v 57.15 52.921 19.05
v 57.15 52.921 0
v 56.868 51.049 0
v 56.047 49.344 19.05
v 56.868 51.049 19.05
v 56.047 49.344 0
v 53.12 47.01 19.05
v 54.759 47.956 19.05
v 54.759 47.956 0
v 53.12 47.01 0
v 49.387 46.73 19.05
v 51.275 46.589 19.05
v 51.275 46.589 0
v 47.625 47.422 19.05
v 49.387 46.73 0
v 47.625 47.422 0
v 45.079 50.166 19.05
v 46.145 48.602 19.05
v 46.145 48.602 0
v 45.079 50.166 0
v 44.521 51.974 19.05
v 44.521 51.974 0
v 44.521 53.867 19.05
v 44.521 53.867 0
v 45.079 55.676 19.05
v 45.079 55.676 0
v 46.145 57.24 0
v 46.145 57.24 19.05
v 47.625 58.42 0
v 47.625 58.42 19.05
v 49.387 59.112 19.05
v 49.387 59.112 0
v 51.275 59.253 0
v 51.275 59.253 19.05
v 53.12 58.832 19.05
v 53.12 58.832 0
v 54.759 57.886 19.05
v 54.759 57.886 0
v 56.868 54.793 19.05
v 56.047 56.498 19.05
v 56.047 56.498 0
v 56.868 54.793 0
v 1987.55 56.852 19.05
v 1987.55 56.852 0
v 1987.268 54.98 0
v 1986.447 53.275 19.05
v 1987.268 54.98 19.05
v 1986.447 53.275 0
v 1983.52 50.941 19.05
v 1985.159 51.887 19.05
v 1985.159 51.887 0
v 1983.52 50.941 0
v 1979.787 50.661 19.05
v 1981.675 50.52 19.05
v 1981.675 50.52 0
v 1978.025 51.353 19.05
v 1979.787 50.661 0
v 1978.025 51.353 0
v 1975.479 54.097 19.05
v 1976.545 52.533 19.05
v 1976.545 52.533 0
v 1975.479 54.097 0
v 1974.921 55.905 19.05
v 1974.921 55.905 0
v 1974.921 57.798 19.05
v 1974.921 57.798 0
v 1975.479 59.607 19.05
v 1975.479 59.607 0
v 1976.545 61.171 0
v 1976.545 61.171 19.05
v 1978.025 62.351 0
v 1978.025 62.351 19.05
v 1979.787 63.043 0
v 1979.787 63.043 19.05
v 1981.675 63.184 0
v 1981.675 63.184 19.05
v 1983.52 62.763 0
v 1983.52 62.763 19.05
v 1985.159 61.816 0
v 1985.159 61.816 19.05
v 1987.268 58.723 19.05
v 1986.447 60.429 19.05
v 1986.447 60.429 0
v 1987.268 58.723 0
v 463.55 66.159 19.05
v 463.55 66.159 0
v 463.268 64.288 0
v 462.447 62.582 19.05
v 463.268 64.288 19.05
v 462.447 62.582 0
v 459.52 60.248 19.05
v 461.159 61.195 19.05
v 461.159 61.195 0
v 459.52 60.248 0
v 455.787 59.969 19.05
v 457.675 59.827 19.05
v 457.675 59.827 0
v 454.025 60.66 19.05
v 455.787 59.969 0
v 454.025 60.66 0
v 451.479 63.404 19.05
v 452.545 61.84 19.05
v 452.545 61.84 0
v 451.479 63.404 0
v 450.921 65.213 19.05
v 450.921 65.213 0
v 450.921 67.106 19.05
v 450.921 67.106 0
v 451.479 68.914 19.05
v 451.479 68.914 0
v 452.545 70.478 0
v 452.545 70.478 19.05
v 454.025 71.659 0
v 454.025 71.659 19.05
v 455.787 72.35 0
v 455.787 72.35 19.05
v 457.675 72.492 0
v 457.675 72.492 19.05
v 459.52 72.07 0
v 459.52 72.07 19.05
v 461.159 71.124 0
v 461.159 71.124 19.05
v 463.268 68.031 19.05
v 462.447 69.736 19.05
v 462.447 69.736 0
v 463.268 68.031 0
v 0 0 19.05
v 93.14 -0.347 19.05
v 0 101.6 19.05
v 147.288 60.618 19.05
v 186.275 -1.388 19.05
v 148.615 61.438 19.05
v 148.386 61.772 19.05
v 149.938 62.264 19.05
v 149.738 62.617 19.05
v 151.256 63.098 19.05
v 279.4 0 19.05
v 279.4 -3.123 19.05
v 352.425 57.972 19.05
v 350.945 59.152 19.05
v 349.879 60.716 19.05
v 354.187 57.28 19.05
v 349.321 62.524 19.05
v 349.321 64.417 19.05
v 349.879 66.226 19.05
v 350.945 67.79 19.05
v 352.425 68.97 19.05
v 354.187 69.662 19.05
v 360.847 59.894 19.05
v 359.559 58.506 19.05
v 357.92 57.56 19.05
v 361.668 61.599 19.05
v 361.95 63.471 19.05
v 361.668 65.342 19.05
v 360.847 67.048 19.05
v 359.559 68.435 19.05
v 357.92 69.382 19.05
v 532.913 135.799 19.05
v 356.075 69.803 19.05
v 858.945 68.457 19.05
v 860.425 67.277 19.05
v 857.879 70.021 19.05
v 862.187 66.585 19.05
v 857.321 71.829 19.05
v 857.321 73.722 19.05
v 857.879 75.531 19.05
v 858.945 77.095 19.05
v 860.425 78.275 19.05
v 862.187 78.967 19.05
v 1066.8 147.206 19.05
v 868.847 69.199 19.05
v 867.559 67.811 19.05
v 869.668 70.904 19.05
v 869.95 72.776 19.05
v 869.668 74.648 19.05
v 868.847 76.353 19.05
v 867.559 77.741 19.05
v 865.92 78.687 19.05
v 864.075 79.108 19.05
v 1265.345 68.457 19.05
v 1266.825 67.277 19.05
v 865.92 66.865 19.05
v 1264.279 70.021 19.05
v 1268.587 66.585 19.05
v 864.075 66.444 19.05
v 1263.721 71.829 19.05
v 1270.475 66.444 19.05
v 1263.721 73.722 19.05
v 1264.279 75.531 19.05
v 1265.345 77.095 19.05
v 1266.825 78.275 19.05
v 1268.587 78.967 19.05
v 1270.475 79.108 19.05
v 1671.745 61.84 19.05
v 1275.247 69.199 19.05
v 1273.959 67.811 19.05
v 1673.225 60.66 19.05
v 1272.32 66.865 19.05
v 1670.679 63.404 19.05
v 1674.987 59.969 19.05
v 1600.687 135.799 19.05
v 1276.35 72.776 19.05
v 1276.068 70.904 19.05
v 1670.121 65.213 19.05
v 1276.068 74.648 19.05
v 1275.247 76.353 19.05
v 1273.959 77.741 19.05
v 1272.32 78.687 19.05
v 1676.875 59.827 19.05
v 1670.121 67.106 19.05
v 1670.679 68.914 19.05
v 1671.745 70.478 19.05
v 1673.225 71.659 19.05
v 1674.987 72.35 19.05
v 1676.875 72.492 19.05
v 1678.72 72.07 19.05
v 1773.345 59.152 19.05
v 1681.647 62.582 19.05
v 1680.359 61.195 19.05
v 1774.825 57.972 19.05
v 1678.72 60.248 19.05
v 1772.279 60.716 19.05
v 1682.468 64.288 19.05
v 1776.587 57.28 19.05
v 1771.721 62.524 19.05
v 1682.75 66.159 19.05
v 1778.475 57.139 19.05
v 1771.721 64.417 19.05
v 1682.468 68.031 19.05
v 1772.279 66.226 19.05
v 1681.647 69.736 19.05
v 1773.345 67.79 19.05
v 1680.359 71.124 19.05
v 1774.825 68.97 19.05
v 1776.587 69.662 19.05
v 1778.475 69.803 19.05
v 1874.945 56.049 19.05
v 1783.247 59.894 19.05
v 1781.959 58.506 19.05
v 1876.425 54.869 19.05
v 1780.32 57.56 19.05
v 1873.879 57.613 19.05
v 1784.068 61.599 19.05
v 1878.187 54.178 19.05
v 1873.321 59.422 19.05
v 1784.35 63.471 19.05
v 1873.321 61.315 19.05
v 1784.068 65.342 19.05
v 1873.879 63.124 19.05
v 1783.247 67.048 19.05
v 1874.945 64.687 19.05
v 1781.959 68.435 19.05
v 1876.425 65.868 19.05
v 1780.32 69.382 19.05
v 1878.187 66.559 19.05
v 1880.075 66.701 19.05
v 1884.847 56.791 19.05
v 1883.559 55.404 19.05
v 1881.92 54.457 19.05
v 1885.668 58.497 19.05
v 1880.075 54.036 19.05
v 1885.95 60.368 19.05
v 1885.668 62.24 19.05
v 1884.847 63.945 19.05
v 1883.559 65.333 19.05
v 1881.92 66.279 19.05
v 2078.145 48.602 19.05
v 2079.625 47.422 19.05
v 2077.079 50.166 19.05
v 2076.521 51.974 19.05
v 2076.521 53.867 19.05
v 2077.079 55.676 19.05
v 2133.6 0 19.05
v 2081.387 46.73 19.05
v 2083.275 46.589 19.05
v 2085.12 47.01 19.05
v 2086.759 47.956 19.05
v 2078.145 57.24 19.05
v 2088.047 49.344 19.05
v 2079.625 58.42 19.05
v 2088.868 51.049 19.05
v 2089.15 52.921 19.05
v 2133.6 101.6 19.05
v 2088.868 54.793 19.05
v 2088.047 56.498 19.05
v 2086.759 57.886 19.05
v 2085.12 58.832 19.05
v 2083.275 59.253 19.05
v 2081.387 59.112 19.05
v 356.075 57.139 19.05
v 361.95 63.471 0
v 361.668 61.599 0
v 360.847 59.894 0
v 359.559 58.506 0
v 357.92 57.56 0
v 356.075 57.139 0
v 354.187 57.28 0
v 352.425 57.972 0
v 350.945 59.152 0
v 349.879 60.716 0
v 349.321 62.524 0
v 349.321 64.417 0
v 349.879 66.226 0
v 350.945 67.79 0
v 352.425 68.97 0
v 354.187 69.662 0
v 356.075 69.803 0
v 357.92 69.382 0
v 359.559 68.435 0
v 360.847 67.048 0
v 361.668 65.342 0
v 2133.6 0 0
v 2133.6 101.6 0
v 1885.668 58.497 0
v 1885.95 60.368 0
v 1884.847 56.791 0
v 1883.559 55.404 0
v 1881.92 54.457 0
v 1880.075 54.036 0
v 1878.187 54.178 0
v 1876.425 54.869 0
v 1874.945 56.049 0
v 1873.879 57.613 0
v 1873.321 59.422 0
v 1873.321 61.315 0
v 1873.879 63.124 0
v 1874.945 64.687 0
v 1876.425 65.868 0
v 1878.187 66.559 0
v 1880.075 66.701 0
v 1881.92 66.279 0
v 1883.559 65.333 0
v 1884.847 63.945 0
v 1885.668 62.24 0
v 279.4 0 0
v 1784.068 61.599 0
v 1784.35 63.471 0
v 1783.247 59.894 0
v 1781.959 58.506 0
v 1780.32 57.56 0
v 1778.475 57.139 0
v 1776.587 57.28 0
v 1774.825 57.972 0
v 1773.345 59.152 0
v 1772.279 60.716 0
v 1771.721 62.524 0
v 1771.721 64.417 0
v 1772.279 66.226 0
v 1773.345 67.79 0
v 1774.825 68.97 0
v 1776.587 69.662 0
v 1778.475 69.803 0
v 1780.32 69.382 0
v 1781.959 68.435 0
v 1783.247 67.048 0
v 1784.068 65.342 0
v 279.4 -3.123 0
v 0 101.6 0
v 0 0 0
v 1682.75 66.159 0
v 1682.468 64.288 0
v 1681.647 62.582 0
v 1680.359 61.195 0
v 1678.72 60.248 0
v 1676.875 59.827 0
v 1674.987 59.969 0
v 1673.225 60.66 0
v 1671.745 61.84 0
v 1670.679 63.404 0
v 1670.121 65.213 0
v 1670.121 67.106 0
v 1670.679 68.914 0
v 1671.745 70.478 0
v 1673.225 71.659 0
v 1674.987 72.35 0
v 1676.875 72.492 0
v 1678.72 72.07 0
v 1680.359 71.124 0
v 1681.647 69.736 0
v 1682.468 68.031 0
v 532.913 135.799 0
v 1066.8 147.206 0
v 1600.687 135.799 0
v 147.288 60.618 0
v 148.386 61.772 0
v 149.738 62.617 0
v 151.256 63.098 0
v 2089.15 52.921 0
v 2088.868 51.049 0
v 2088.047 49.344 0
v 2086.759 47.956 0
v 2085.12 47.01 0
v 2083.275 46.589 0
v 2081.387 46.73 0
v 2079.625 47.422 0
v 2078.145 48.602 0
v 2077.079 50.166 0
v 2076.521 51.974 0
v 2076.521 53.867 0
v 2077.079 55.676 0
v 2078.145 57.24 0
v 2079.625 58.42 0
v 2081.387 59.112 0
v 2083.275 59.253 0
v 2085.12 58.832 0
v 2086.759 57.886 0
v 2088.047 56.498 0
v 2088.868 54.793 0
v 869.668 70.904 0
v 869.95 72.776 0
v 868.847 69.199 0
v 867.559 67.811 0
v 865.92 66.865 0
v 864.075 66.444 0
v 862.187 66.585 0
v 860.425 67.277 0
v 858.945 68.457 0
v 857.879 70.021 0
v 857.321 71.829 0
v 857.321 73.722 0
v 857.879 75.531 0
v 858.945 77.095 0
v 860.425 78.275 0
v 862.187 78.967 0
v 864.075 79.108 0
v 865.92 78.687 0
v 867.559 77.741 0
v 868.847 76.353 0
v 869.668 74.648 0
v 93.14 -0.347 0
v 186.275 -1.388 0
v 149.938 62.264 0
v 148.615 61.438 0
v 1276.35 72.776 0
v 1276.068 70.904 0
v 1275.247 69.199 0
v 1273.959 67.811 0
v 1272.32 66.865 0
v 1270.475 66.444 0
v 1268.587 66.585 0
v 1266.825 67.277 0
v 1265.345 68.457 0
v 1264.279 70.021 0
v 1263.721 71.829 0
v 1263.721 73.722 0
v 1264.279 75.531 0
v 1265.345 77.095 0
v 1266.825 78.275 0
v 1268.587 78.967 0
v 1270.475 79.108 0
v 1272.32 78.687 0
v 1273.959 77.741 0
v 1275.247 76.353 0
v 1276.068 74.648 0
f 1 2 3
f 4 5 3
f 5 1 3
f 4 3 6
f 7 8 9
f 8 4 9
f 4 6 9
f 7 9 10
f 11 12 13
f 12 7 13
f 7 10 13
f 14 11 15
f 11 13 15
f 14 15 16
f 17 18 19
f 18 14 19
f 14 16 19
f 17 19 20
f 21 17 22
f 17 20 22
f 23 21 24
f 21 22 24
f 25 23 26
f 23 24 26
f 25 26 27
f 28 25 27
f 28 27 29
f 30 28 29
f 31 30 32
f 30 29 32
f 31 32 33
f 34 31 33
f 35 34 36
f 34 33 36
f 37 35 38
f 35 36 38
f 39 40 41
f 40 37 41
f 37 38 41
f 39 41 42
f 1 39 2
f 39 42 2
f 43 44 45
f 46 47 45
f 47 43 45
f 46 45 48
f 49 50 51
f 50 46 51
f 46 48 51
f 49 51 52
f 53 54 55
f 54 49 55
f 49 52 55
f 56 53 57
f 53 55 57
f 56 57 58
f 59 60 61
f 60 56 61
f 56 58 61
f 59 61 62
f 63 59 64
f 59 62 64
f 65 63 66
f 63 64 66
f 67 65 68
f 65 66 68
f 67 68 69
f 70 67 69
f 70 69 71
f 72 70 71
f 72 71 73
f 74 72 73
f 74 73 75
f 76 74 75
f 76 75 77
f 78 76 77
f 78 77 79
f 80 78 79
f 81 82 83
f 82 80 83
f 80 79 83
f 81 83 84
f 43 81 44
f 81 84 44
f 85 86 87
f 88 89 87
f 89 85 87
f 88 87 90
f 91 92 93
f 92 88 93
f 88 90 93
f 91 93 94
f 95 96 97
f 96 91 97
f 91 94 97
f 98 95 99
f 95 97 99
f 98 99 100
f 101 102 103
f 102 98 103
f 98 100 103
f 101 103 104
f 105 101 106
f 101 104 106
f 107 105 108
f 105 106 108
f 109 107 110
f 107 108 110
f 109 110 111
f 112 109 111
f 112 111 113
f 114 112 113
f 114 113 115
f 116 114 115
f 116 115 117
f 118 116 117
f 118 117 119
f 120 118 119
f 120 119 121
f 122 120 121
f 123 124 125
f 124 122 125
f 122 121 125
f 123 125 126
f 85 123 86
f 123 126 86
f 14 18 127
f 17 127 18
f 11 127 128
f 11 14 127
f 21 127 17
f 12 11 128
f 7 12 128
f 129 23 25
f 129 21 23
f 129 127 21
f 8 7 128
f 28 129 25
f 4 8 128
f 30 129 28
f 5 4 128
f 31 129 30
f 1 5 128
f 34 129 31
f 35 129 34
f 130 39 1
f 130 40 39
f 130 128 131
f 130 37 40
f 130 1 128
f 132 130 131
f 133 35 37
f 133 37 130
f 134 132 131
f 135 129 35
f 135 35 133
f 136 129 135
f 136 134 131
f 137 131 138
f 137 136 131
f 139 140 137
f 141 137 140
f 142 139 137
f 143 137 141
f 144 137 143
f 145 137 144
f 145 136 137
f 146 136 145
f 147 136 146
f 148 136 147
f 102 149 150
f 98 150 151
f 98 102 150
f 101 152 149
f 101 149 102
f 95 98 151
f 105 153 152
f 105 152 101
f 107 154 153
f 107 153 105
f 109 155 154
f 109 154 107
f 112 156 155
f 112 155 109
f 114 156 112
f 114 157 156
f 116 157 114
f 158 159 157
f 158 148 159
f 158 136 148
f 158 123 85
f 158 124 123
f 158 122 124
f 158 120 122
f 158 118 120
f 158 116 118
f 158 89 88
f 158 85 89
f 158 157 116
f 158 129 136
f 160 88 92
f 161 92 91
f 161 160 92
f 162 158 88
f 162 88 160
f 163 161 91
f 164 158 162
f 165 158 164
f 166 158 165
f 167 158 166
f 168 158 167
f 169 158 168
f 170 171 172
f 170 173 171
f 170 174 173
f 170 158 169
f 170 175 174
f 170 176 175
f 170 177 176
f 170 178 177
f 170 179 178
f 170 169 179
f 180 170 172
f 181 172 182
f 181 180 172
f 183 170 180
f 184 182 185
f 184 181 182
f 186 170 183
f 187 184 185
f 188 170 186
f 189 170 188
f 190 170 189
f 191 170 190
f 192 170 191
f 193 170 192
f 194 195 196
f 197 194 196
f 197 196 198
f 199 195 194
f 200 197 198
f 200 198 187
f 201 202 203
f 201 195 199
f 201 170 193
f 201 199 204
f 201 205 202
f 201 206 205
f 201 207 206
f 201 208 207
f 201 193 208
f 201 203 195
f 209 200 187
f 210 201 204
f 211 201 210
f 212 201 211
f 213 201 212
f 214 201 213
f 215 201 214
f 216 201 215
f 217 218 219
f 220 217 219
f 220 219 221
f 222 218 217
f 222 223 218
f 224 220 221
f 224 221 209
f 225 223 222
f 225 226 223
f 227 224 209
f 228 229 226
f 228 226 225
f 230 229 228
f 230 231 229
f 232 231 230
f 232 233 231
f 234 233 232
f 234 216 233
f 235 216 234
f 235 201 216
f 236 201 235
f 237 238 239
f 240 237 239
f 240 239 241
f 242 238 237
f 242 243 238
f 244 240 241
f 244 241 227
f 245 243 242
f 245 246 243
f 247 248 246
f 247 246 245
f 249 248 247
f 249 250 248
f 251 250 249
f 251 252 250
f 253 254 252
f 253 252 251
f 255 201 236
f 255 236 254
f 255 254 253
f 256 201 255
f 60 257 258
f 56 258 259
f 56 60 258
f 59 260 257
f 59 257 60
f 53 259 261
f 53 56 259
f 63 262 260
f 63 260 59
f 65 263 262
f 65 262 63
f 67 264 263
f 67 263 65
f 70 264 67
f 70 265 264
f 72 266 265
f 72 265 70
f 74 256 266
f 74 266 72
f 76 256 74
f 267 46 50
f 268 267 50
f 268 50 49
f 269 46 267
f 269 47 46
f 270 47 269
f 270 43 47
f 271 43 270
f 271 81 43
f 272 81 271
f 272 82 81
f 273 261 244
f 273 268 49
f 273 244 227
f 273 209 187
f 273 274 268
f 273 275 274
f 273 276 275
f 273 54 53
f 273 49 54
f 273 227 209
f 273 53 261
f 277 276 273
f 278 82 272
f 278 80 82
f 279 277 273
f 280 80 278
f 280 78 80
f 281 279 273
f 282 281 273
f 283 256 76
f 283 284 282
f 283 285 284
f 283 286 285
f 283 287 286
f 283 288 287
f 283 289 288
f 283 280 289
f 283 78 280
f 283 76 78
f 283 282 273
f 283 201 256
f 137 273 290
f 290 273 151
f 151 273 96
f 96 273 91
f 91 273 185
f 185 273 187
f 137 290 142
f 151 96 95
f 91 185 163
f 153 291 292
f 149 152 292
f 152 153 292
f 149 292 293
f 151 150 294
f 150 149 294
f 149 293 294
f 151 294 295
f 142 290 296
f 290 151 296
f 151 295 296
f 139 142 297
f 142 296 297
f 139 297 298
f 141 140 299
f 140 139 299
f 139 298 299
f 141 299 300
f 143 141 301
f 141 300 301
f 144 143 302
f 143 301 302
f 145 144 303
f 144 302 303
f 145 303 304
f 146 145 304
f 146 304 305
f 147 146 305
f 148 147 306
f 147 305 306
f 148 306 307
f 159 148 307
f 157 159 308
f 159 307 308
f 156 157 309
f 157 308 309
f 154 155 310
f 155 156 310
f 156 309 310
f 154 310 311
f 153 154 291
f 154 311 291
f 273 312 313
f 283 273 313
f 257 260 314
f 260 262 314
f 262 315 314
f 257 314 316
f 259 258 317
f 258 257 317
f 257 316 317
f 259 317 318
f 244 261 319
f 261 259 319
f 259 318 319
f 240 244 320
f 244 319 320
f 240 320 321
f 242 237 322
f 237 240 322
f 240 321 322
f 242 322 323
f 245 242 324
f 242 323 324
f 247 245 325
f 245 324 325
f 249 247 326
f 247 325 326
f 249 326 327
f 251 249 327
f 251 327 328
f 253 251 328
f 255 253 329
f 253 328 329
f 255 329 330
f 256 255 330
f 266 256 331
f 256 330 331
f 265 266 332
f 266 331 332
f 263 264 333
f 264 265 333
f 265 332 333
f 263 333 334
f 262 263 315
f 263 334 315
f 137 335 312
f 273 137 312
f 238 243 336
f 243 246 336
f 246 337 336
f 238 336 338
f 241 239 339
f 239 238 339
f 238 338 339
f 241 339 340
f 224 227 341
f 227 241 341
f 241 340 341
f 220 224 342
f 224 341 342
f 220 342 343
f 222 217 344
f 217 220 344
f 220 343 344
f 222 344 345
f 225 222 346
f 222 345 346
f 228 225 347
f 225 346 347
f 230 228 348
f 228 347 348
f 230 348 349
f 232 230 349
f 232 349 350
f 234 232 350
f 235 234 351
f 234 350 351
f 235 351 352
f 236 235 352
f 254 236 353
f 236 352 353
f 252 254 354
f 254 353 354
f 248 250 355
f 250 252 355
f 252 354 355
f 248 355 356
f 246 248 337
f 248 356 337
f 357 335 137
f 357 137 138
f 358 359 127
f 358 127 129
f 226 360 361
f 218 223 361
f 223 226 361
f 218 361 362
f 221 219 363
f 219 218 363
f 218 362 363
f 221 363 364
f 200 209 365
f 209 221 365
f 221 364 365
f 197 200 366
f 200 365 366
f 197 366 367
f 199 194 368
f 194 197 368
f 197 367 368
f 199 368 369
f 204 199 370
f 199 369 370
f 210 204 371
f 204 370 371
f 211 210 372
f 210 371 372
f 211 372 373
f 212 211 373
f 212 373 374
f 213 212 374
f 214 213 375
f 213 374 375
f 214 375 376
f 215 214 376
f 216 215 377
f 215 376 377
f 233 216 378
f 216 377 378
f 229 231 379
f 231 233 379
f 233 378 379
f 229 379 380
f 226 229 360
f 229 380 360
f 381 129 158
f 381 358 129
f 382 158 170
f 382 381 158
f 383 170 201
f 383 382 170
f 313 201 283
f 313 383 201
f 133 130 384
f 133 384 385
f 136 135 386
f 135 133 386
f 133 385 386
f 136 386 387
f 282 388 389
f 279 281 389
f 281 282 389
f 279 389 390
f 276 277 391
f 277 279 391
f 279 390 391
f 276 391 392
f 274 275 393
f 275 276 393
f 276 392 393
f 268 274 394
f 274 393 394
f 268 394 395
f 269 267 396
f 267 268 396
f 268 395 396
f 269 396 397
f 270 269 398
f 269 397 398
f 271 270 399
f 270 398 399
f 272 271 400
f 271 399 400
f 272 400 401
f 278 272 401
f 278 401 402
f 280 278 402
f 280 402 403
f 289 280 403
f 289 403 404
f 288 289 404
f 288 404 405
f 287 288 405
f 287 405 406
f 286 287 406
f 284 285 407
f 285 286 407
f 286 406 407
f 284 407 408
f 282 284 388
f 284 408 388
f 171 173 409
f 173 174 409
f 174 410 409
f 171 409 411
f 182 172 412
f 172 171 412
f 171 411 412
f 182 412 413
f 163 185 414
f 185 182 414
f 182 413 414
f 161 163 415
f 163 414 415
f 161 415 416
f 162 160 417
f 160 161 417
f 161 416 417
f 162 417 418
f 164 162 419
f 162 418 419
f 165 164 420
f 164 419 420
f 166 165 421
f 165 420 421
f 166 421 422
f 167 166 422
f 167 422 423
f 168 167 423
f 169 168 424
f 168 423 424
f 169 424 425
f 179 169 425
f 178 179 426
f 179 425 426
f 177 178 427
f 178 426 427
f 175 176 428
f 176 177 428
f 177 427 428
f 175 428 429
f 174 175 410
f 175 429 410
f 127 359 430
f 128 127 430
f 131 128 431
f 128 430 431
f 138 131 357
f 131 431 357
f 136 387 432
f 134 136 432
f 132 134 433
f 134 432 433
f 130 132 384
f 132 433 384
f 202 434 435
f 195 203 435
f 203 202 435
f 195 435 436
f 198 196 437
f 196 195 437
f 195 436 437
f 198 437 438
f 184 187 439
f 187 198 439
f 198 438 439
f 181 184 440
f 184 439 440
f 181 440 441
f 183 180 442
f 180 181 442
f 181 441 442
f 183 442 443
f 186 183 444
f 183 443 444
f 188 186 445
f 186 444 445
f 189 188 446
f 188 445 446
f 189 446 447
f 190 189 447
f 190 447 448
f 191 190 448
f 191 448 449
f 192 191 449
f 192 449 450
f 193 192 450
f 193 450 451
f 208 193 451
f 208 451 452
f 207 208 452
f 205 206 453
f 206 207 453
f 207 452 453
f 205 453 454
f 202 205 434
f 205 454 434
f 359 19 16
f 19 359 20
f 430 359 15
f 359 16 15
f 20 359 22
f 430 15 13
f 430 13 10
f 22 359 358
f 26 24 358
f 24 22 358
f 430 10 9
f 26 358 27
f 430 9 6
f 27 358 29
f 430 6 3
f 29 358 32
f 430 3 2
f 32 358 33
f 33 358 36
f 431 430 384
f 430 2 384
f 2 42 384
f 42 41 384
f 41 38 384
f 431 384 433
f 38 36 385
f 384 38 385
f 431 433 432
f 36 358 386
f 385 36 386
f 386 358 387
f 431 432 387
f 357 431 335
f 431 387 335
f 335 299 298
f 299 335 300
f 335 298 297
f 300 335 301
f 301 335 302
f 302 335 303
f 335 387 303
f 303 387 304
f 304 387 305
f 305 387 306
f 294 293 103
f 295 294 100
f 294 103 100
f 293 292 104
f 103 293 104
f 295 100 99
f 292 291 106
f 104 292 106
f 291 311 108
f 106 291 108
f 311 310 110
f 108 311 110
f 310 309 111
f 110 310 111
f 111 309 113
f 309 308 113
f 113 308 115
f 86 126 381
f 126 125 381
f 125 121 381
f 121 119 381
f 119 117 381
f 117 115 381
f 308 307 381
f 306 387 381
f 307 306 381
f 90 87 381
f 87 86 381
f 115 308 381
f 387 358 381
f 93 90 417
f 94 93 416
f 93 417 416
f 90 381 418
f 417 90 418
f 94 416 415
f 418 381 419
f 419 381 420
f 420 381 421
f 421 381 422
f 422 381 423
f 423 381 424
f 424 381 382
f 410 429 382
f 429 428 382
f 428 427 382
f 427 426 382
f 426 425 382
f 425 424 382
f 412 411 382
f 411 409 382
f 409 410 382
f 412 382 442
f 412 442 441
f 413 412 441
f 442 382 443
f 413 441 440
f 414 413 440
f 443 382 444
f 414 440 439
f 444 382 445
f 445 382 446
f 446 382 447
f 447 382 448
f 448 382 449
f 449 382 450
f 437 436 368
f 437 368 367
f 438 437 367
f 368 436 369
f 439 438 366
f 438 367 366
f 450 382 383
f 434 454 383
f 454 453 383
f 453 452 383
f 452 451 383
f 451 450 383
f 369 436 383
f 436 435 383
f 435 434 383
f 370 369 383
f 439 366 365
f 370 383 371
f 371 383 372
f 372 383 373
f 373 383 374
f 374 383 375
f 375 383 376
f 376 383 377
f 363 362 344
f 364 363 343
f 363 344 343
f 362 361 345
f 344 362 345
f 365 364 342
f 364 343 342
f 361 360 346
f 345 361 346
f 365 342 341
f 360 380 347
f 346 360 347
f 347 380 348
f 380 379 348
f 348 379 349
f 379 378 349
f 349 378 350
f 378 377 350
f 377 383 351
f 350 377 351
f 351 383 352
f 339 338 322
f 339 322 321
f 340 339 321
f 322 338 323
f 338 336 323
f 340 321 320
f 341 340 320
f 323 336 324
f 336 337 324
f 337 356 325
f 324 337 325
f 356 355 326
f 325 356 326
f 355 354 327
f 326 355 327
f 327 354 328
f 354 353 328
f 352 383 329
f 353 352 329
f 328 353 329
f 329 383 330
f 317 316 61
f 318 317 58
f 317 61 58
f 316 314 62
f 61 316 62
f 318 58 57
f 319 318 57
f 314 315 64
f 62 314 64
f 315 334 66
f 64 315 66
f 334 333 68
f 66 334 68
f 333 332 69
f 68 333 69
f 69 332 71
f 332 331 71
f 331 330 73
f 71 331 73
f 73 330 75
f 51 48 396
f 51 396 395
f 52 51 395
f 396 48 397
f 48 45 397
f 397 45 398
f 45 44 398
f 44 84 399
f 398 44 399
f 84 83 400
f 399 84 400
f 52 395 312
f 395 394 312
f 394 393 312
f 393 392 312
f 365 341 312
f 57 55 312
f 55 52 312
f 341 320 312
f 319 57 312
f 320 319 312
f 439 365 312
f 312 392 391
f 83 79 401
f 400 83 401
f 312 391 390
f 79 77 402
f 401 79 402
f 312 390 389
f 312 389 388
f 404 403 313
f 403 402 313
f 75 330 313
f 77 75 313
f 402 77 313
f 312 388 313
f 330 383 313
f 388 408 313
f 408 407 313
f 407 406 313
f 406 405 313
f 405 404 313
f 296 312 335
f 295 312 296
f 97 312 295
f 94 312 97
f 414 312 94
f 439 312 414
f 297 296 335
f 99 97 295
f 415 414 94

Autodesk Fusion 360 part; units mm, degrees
sketch "Camber Block" plane through (0, 0, 0) normal (0, 0, 1) x (1, 0, 0)
  line L0 (0, 0) -> (2133.6, 0)
  line L1 (2133.6, 0) -> (2133.6, 101.6)
  line L2 (0, 0) -> (0, 101.6)
  arc A0 (2133.6, 101.6) -> (0, 101.6) centre (1066.8, -12352.7943) ccw
  circle A1 centre (50.8, 52.9209) radius 6.35
  circle A2 centre (152.4, 56.8518) radius 6.35
  circle A3 centre (254, 60.3684) radius 6.35
  circle A4 centre (355.6, 63.4708) radius 6.35
  line L3 (1066.8, 0) -> (1066.8, 147.2057) construction
  arc A5 (2133.6, 50.8) -> (0, 50.8) centre (1066.8, -24892.1929) ccw construction
  circle A6 centre (457.2, 66.1593) radius 6.35
  circle A7 centre (863.6, 72.7759) radius 6.35
  circle A8 centre (1270, 72.7759) radius 6.35
  circle A9 centre (1676.4, 66.1593) radius 6.35
  circle A10 centre (1778, 63.4708) radius 6.35
  circle A11 centre (1879.6, 60.3684) radius 6.35
  circle A12 centre (1981.2, 56.8518) radius 6.35
  circle A13 centre (2082.8, 52.9209) radius 6.35
  line L4 (416.8, 130.2942) -> (1716.8, 130.2942) construction
  dimension "BlockWidth" = 2133.6
  dimension "EndHeight" = 101.6
  dimension "CamberRadius" = 12500
  dimension "HoleDiameter" = 12.7
  dimension "d5" = 50.8
  dimension "d7" = 101.6
  dimension "d8" = 101.6
  dimension "d9" = 101.6
  dimension "d11" = 101.6
  dimension "d12" = 406.4
  dimension "TestLine" = 1300
  dimension "d16" = 22.5203
extrude "Extrude1" add sketch "Camber Block" along normal blind 19.05
equation "BlockWidth = 84\""
equation "EndHeight = 4\""
equation "d12 = 16\""

Autodesk Fusion 360 part; units mm, degrees
sketch "End Block Outline" plane through (0, 0, 0) normal (0, 0, 1) x (1, 0, 0)
  line L0 (0, 0) -> (0, 19.05)
  line L1 (0, 0) -> (279.4, 0) construction
  arc A0 (279.4, -3.123) -> (0, 0) centre (0, -12500) ccw
  arc A1 (0, 19.05) -> (195.4998, 97.9237) centre (0, 300.7741) ccw
  line L2 (0, 19.05) -> (279.4, 19.05) construction
  line L3 (279.4, 0) -> (279.4, -3.123) construction
  arc A2 (279.4, 62.2608) -> (195.4998, 97.9237) centre (229.8704, 62.2608) ccw
  line L4 (279.4, 62.2608) -> (279.4, -3.123)
  circle A3 centre (127, 22.225) radius 6.35
  circle A4 centre (228.6, 53.7591) radius 6.35
  line L5 (170, 19.05) -> (170, 76.1222) construction
  dimension "EndThickness" = 19.05
  dimension "BaseRadius" = 12500
  dimension "ArcRadius" = 281.7241
  dimension "BlockWidth" = 279.4
  dimension "ArcCordLength" = 210.8109
  dimension "d13" = 12.7
  dimension "d14" = 127
  dimension "d15" = 22.225
  dimension "d16" = 101.6
  dimension "d17" = 31.5341
  dimension "TestLength" = 170
  dimension "d2" = 65.002
extrude "Extrude1" add sketch "End Block Outline" along normal blind 19.05
equation "BlockWidth = 11\""
equation "ArcCordLength = 2 * ArcRadius * sin(ArcAngle / 2)"
equation "d14 = 5\""
equation "d15 = ( 7 / 8 ) * 1\""
equation "d16 = 4\""
equation "ArcLength = 216.06764 mm"
equation "ArcAngle = ( 360 * ArcLength / ( 2 * PI * ArcRadius ) ) * 1 deg" comment "Internal computation"
